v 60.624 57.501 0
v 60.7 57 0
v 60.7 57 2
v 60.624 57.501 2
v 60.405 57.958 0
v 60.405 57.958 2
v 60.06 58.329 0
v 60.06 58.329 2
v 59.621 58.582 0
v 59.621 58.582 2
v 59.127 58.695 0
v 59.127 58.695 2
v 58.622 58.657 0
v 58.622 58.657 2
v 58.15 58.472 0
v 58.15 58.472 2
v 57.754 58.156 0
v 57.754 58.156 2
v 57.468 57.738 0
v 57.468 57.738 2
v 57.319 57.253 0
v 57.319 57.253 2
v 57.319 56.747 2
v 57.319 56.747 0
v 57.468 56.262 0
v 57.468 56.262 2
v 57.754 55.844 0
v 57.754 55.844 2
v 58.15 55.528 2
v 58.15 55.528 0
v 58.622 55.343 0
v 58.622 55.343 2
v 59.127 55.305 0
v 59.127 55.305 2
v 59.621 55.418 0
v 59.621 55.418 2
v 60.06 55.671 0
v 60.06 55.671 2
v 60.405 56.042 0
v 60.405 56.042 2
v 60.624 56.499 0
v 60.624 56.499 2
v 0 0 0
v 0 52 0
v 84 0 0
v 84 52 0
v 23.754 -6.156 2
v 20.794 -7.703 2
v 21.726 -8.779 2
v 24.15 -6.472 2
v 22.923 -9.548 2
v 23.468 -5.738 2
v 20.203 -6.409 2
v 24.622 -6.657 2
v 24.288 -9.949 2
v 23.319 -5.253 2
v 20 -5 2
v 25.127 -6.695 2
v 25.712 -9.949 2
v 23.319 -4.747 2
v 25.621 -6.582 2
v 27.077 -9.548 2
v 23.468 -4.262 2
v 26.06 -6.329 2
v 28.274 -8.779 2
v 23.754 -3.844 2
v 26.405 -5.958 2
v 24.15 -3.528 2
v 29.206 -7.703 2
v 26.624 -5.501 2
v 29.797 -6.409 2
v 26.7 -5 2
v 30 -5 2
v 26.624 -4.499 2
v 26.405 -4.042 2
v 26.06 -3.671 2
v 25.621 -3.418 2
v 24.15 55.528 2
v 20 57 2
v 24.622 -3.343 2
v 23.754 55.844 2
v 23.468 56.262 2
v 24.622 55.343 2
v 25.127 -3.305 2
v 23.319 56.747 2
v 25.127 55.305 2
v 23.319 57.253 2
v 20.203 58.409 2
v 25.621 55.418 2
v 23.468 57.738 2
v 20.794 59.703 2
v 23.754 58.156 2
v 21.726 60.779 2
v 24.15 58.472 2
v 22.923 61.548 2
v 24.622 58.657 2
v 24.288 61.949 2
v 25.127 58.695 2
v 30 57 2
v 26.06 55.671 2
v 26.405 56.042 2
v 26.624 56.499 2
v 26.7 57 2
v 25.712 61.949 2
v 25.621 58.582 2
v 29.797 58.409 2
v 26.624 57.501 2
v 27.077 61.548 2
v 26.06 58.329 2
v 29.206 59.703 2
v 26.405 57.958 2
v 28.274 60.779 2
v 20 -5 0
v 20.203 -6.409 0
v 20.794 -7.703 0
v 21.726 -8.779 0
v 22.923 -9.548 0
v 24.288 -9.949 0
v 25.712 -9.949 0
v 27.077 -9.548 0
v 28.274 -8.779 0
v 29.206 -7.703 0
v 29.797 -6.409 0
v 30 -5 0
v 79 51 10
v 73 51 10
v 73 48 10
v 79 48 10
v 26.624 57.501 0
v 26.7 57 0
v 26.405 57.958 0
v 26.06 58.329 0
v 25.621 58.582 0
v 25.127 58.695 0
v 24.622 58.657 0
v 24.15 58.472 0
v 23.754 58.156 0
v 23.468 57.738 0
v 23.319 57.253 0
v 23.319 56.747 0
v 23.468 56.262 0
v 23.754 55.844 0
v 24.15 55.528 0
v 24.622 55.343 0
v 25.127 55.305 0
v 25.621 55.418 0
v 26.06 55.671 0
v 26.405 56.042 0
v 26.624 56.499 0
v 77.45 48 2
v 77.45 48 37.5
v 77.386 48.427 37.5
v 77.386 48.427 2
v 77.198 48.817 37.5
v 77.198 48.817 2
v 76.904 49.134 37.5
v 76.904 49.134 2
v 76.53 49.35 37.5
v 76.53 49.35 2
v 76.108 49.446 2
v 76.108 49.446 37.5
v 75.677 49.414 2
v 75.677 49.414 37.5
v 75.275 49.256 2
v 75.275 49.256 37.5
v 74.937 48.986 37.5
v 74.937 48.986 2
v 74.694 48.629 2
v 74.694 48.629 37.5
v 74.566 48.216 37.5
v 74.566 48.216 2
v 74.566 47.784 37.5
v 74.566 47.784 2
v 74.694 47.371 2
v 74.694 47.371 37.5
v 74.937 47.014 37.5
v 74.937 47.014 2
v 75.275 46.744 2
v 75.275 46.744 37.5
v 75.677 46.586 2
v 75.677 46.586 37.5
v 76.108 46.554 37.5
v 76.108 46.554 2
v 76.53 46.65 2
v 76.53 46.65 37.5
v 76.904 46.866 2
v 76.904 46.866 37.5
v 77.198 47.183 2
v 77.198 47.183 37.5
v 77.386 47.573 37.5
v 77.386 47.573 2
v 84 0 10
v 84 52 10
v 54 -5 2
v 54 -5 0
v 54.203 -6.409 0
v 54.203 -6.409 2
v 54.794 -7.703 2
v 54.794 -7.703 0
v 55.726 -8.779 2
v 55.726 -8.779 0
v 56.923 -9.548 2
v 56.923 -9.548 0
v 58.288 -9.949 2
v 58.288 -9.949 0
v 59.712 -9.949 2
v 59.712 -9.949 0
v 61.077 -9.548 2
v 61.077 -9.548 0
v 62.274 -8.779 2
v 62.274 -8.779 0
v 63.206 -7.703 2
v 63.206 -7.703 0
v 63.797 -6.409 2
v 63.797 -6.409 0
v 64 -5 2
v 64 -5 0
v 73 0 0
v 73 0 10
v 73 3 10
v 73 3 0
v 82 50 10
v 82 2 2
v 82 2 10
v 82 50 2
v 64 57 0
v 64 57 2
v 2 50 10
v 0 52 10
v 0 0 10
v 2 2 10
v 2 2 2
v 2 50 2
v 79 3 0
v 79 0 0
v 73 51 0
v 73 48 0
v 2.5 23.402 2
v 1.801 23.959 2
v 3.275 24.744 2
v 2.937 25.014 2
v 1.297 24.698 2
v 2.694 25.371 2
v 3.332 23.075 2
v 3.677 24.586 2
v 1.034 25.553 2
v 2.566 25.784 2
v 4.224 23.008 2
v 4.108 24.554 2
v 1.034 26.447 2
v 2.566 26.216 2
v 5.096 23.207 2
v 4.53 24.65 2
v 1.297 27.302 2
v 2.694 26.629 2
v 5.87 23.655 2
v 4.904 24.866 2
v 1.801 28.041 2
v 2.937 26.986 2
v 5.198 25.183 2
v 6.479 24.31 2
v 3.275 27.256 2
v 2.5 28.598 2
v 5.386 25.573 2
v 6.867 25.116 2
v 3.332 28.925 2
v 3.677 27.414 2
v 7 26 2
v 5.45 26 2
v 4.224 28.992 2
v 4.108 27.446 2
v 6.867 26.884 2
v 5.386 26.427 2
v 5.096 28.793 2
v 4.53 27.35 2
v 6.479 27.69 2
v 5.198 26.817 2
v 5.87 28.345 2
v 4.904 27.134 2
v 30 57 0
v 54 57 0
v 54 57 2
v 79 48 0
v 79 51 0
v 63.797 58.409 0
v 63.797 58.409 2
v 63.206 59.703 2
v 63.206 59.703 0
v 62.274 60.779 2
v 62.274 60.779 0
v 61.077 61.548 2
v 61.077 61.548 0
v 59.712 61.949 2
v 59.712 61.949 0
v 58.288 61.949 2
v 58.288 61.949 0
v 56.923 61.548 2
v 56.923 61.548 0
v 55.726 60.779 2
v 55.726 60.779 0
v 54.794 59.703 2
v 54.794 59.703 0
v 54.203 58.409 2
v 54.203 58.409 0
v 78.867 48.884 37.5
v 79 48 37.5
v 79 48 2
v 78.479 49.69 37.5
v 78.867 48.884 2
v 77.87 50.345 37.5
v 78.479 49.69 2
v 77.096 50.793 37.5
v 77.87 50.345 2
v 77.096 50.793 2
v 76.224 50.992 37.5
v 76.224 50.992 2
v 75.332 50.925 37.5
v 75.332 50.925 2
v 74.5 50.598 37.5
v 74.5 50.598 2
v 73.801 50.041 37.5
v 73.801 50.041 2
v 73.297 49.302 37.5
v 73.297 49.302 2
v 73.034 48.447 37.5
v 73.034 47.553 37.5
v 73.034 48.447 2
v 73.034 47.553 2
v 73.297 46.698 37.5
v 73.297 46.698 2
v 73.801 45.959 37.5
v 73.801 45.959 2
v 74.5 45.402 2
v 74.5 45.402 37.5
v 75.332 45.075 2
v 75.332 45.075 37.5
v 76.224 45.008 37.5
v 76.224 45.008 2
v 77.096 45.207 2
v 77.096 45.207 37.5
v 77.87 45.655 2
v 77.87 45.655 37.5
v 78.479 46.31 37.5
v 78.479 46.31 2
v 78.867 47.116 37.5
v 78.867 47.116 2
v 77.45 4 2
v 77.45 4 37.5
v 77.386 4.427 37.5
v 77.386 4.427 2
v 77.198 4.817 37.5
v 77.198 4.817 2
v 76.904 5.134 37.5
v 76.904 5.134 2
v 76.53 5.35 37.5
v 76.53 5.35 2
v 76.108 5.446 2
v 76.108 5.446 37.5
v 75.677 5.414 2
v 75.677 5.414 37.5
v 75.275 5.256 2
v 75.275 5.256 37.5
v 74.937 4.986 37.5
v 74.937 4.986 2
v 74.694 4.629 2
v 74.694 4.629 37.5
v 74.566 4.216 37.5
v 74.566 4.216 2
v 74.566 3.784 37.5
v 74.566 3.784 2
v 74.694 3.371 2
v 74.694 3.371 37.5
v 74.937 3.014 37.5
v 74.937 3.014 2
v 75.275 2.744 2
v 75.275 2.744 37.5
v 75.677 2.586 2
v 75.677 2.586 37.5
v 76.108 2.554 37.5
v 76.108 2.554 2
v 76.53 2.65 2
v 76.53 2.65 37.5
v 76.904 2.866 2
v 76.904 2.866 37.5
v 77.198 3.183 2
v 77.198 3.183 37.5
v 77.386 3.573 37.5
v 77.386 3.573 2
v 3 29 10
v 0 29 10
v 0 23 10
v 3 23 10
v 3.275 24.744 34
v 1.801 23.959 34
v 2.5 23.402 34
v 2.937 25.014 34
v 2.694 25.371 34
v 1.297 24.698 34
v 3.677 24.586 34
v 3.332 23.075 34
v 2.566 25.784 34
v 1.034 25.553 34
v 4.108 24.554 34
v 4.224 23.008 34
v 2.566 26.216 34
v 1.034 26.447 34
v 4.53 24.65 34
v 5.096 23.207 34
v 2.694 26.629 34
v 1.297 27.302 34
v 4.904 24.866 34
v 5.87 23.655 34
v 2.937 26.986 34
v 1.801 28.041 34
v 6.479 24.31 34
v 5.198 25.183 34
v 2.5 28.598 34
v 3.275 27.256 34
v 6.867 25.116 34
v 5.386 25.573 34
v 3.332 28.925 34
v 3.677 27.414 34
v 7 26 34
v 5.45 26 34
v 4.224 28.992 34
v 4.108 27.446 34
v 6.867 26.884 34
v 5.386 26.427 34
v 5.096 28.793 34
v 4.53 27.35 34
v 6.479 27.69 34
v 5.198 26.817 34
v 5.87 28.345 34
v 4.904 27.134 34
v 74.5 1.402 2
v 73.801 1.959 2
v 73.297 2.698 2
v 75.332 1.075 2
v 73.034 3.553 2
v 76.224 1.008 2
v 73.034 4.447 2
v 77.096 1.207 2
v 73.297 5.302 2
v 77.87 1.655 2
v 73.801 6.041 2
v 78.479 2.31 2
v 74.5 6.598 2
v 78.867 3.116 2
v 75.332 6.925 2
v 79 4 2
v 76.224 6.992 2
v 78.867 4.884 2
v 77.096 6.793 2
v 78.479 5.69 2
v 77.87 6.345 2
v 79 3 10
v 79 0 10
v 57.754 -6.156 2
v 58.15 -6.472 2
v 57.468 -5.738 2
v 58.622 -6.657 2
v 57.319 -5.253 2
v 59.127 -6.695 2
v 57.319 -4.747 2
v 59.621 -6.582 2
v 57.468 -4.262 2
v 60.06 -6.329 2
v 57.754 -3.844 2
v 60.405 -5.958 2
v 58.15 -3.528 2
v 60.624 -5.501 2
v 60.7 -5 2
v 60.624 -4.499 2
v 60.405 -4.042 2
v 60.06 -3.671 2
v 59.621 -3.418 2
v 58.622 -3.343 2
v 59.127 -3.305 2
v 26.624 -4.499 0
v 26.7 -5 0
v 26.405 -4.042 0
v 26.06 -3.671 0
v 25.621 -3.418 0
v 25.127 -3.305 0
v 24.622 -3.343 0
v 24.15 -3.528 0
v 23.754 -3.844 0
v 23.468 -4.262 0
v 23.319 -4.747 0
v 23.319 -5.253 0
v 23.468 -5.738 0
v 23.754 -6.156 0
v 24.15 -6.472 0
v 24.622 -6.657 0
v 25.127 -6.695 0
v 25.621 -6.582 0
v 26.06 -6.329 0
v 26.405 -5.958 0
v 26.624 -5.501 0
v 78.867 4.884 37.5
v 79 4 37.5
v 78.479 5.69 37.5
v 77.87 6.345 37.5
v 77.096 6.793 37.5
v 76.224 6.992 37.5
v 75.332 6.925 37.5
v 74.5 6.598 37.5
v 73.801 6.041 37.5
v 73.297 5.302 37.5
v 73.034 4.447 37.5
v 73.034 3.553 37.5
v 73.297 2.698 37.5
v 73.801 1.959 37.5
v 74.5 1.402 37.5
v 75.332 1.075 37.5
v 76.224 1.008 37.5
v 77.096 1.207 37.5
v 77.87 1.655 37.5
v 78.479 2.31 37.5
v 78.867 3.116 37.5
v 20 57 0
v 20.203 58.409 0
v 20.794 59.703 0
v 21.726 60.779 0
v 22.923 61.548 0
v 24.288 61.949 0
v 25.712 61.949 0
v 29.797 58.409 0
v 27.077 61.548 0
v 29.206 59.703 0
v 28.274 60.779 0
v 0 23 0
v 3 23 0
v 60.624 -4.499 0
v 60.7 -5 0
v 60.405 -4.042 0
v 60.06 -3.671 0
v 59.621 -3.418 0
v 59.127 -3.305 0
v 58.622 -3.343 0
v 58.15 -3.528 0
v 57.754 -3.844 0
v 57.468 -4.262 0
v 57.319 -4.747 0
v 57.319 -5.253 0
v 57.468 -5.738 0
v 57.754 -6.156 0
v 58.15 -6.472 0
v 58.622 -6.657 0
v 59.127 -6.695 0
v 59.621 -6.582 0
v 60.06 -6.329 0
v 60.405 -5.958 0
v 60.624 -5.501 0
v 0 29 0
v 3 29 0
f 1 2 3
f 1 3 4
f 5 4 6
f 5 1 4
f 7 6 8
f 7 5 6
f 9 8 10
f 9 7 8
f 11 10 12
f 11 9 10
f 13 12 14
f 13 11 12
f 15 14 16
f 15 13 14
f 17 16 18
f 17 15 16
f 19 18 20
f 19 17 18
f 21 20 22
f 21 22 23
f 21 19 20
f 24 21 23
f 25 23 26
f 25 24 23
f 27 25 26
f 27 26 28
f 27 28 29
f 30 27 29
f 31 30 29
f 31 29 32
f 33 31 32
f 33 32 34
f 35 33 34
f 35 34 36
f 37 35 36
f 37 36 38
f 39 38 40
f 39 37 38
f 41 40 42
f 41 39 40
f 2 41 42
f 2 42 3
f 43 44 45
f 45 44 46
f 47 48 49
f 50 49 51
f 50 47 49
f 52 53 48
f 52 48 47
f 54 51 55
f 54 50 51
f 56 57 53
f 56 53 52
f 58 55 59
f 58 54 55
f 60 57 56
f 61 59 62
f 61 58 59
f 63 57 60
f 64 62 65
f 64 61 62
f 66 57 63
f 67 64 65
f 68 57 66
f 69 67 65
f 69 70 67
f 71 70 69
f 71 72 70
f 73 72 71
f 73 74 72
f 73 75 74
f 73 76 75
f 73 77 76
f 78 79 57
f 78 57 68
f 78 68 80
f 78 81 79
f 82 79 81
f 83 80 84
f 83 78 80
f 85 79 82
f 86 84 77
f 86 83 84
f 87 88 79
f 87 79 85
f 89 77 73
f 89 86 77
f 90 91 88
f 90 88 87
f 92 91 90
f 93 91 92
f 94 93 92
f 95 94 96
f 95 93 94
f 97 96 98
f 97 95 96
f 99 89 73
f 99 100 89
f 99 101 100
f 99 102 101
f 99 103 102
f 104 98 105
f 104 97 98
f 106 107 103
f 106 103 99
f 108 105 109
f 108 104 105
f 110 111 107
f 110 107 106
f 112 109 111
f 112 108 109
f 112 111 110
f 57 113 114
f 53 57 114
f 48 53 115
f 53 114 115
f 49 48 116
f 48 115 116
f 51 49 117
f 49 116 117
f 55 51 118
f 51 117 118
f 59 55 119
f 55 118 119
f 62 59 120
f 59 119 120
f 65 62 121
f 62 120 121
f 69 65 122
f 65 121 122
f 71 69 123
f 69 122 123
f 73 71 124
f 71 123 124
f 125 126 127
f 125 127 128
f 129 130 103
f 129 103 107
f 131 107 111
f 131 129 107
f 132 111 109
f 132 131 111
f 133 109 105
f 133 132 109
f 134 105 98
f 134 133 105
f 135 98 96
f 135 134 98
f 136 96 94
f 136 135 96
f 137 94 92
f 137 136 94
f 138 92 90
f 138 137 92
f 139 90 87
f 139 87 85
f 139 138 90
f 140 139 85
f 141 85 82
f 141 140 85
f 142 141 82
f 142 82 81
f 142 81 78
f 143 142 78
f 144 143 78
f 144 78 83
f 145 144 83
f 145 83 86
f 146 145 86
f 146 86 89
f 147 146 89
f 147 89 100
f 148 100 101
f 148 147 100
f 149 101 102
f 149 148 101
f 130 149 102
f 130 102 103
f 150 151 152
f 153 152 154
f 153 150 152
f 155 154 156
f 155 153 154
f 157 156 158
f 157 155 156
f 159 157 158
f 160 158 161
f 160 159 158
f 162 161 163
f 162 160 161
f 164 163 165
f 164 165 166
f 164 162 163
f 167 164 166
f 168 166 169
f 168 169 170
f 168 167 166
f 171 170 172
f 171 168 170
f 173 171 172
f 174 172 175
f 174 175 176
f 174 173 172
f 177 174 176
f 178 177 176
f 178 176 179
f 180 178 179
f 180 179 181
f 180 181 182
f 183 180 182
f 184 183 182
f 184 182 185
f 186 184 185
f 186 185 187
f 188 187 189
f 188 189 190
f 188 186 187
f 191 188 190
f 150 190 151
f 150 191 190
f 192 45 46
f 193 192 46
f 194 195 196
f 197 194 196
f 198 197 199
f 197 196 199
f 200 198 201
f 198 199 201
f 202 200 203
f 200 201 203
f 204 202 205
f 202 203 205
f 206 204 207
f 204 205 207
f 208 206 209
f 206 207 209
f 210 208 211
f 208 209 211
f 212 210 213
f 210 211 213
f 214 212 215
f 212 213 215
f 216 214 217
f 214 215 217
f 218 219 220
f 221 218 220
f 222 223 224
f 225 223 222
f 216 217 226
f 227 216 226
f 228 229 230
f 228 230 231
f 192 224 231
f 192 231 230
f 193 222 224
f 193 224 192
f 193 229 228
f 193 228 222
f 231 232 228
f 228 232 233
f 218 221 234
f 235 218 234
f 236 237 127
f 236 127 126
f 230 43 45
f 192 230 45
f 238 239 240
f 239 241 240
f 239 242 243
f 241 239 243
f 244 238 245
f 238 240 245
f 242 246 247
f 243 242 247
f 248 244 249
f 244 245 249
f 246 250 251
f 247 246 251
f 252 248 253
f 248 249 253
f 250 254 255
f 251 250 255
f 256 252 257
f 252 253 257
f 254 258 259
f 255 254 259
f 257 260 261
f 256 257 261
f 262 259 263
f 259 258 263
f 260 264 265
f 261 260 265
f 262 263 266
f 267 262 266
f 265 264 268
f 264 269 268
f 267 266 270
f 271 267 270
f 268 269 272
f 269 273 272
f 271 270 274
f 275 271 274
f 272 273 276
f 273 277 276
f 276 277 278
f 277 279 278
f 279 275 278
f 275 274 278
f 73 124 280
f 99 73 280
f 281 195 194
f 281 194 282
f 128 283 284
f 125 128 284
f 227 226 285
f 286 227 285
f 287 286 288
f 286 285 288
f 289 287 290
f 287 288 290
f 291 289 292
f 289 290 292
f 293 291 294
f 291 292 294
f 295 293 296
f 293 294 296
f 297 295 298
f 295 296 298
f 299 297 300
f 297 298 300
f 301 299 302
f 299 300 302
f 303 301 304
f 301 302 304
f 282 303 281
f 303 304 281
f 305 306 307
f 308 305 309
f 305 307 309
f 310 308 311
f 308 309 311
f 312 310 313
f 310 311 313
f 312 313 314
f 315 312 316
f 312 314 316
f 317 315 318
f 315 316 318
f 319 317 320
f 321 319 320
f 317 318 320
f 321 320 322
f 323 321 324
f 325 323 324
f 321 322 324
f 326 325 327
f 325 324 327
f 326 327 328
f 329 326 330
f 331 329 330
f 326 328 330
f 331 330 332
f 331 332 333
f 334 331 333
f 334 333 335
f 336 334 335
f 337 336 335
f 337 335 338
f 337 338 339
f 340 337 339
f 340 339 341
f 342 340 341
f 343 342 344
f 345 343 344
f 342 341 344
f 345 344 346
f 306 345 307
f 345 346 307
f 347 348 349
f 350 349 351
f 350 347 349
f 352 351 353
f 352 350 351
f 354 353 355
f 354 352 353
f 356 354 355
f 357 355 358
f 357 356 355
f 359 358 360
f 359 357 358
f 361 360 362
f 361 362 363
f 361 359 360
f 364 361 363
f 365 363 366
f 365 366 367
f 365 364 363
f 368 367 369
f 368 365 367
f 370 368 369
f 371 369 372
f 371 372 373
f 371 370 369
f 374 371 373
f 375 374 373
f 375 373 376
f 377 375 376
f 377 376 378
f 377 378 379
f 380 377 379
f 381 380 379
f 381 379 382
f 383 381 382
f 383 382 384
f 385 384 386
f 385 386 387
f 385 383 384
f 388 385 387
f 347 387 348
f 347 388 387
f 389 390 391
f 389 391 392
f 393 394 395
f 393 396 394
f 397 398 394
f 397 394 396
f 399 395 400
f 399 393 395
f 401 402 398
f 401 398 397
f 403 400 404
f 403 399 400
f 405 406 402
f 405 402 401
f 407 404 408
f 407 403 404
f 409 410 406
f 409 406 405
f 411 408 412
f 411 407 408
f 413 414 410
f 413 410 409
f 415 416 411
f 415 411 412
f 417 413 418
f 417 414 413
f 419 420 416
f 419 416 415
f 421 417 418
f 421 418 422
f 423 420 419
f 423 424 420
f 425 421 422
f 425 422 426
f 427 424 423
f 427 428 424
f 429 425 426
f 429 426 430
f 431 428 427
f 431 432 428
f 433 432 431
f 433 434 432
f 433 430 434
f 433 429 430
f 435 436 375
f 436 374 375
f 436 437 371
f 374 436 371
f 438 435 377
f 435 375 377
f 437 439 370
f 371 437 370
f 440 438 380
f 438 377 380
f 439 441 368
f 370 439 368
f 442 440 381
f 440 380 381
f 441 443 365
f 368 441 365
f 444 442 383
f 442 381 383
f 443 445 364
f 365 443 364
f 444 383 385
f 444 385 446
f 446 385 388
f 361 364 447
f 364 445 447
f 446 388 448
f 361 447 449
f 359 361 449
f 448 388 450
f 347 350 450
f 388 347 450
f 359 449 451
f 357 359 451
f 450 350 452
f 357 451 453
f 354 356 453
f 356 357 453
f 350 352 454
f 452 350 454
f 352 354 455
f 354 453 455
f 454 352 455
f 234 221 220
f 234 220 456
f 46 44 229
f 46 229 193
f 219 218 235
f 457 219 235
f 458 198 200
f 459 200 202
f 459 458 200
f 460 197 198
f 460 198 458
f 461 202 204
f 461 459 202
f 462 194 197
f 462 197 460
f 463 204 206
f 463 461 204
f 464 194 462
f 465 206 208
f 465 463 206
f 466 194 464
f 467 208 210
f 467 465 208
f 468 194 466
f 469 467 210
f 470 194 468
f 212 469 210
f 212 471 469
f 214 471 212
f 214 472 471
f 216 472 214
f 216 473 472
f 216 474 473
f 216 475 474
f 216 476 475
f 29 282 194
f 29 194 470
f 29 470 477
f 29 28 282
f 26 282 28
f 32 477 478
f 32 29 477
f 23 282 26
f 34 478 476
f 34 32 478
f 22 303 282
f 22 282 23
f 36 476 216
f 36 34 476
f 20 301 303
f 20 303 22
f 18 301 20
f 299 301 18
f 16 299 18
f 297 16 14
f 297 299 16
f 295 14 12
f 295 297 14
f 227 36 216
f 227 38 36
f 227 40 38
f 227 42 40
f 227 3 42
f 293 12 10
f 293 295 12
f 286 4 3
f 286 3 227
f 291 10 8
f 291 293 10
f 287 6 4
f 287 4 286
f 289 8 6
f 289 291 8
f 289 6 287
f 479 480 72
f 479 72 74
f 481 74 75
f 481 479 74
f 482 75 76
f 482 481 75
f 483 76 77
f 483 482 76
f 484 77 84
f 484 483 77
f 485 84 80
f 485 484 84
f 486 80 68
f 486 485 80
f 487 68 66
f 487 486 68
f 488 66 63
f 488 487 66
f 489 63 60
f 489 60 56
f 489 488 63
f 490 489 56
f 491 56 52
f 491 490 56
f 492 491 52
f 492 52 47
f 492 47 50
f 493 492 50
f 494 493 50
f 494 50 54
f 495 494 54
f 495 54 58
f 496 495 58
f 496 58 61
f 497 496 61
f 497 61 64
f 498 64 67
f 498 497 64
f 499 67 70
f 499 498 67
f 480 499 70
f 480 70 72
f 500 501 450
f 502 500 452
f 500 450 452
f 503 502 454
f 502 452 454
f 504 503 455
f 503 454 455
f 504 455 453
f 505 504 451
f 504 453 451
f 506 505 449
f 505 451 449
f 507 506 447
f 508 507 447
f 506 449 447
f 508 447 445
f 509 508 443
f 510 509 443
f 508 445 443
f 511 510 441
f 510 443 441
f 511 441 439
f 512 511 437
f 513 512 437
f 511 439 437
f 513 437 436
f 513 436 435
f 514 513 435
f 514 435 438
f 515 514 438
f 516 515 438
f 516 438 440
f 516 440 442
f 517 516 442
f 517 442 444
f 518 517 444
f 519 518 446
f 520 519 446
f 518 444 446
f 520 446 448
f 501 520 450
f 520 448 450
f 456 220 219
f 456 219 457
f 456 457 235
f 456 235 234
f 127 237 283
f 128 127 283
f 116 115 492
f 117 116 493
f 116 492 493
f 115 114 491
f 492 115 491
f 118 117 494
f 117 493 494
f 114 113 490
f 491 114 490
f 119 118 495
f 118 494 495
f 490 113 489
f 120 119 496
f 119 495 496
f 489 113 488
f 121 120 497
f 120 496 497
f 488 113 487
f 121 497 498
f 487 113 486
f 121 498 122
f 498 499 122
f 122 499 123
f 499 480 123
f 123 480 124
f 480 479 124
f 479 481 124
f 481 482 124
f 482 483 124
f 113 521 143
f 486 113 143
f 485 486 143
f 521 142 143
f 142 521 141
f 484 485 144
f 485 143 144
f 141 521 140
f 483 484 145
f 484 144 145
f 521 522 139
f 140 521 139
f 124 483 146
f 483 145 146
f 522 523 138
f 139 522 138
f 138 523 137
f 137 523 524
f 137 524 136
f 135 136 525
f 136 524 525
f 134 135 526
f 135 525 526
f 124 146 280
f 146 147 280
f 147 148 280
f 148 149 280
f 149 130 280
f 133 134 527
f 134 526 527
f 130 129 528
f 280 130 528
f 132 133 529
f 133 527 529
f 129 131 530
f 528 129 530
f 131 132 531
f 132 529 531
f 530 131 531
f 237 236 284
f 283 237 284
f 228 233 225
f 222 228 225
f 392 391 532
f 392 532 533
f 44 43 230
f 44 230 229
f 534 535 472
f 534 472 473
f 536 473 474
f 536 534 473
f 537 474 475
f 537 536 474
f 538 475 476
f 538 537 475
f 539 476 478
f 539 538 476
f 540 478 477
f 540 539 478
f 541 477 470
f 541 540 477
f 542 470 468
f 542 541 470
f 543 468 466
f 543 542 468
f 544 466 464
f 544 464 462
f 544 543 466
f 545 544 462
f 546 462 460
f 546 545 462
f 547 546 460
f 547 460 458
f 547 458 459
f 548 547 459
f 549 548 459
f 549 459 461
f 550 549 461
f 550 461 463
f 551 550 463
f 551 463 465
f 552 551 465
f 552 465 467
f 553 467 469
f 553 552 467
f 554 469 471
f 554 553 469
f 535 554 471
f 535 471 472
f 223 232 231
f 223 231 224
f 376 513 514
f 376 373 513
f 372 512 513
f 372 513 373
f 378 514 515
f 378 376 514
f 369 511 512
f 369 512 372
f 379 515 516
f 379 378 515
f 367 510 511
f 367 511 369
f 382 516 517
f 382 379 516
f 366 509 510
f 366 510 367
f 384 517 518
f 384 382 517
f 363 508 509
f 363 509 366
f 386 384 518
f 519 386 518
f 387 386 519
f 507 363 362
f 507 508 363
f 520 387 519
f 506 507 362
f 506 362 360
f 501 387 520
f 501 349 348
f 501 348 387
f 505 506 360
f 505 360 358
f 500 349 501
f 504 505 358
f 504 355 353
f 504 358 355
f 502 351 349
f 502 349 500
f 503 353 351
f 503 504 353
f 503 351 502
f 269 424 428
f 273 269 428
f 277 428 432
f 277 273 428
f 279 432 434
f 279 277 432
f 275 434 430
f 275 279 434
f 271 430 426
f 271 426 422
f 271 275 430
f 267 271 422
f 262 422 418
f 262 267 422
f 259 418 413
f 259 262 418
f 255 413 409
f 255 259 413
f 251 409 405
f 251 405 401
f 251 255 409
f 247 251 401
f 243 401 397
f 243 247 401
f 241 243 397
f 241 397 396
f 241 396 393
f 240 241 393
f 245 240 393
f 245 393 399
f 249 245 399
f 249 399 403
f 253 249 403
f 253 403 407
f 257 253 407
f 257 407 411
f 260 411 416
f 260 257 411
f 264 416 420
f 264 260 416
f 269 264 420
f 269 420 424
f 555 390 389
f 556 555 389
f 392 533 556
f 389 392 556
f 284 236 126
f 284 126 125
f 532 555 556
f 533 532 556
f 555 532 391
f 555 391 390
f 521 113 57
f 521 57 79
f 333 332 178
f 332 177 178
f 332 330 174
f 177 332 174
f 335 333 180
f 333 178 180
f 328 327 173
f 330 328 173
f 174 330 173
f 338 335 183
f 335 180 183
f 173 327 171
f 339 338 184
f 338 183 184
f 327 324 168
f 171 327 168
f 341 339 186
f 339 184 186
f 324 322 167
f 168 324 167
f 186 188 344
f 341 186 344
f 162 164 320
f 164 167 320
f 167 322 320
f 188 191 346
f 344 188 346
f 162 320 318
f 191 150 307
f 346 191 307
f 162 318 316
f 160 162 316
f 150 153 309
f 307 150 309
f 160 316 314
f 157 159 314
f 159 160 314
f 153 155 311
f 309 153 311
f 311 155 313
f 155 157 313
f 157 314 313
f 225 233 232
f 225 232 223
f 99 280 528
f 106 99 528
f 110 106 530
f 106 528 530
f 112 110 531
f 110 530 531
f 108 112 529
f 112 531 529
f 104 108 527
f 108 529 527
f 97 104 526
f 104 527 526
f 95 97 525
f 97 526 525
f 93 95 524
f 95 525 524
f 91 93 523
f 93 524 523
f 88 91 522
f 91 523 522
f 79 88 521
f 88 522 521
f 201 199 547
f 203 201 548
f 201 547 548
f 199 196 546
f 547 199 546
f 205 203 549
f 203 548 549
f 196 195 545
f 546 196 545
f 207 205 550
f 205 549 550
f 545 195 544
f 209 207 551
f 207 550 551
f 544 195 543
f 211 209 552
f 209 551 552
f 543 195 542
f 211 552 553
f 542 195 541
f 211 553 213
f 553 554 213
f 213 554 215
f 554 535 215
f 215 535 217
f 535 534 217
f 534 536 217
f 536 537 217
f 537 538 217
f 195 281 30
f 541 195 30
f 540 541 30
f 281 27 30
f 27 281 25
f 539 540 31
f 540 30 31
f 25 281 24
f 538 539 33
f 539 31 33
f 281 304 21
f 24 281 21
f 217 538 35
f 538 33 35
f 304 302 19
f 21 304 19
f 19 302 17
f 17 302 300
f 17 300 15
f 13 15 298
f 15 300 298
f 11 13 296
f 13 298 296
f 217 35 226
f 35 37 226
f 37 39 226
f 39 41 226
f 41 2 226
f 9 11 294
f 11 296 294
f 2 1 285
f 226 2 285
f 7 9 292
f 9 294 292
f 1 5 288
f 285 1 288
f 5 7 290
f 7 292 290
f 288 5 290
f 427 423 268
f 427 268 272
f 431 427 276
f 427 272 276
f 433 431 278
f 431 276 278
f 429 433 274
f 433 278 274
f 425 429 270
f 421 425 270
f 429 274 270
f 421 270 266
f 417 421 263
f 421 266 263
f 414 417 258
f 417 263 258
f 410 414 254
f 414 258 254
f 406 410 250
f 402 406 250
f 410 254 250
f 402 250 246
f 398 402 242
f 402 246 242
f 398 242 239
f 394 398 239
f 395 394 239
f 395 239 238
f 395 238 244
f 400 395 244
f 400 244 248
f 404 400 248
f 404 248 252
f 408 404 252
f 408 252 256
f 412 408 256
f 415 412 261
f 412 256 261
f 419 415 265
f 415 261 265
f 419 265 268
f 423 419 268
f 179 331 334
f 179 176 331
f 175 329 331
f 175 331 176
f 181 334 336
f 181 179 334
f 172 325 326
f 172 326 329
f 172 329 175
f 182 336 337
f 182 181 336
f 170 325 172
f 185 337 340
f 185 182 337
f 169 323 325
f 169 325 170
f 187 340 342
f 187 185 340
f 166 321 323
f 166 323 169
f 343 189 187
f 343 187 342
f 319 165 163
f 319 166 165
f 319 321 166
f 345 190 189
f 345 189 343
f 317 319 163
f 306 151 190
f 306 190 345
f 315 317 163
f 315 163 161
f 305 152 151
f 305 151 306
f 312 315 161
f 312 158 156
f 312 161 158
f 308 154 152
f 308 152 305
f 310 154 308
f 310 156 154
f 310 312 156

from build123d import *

# Parameters (mm, degrees)
CYLINDER005_R     = 1.45
CYLINDER005_DEPTH = 32
CYLINDER_R        = 3
CYLINDER_DEPTH    = 32
CYLINDER003_R     = 1.45
CYLINDER003_DEPTH = 35.5
CYLINDER001_R     = 3
CYLINDER001_DEPTH = 35.5
CYLINDER004_R     = 1.45
CYLINDER004_DEPTH = 35.5
CYLINDER002_R     = 3
CYLINDER002_DEPTH = 35.5
BOX001_W          = 80
BOX001_H          = 48
BOX001_DEPTH      = 10
BOX_W             = 84
BOX_H             = 52
BOX_DEPTH         = 10
BOX002_W          = 3
BOX002_H          = 6
BOX002_DEPTH      = 10
BOX003_W          = 6
BOX003_H          = 3
BOX003_DEPTH      = 10
BOX004_W          = 6
BOX004_H          = 3
BOX004_DEPTH      = 10
CYLINDER008_R     = 1.7
CYLINDER008_DEPTH = 2
CYLINDER009_R     = 1.7
CYLINDER009_DEPTH = 2
BOX005_W          = 10
BOX005_H          = 62
BOX005_DEPTH      = 2
CYLINDER006_R     = 5
CYLINDER006_DEPTH = 2
CYLINDER007_R     = 5
CYLINDER007_DEPTH = 2
CYLINDER010_R     = 1.7
CYLINDER010_DEPTH = 2
CYLINDER011_R     = 1.7
CYLINDER011_DEPTH = 2
BOX006_W          = 10
BOX006_H          = 62
BOX006_DEPTH      = 2
CYLINDER013_R     = 5
CYLINDER013_DEPTH = 2
CYLINDER012_R     = 5
CYLINDER012_DEPTH = 2


with BuildPart() as cylinder005:
    # Cylinder005 → Cylinder005 (new body)
    with BuildSketch(Plane(origin=(4, 26, 2), x_dir=(1, 0, 0), z_dir=(0, 0, 1))):
        Circle(CYLINDER005_R)
    extrude(amount=CYLINDER005_DEPTH)


with BuildPart() as cut:
    # Cylinder → Cylinder (new body)
    with BuildSketch(Plane(origin=(4, 26, 2), x_dir=(1, 0, 0), z_dir=(0, 0, 1))):
        Circle(CYLINDER_R)
    extrude(amount=CYLINDER_DEPTH)

    # Cut: cut Cylinder005
    add(cylinder005.part, mode=Mode.SUBTRACT)


with BuildPart() as cylinder003:
    # Cylinder003 → Cylinder003 (new body)
    with BuildSketch(Plane(origin=(76, 4, 2), x_dir=(1, 0, 0), z_dir=(0, 0, 1))):
        Circle(CYLINDER003_R)
    extrude(amount=CYLINDER003_DEPTH)


with BuildPart() as cut001:
    # Cylinder001 → Cylinder001 (new body)
    with BuildSketch(Plane(origin=(76, 4, 2), x_dir=(1, 0, 0), z_dir=(0, 0, 1))):
        Circle(CYLINDER001_R)
    extrude(amount=CYLINDER001_DEPTH)

    # Cut001: cut Cylinder003
    add(cylinder003.part, mode=Mode.SUBTRACT)


with BuildPart() as cylinder004:
    # Cylinder004 → Cylinder004 (new body)
    with BuildSketch(Plane(origin=(76, 48, 2), x_dir=(1, 0, 0), z_dir=(0, 0, 1))):
        Circle(CYLINDER004_R)
    extrude(amount=CYLINDER004_DEPTH)


with BuildPart() as cut002:
    # Cylinder002 → Cylinder002 (new body)
    with BuildSketch(Plane(origin=(76, 48, 2), x_dir=(1, 0, 0), z_dir=(0, 0, 1))):
        Circle(CYLINDER002_R)
    extrude(amount=CYLINDER002_DEPTH)

    # Cut002: cut Cylinder004
    add(cylinder004.part, mode=Mode.SUBTRACT)


with BuildPart() as cube001:
    # Box001 → Box001 (new body)
    with BuildSketch(Plane(origin=(2, 2, 2), x_dir=(1, 0, 0), z_dir=(0, 0, 1))):
        with Locations((40, 24)):
            Rectangle(BOX001_W, BOX001_H)
    extrude(amount=BOX001_DEPTH)


with BuildPart() as cut003:
    # Box → Box (new body)
    with BuildSketch(Plane.XY):
        with Locations((42, 26)):
            Rectangle(BOX_W, BOX_H)
    extrude(amount=BOX_DEPTH)

    # Cut003: cut Cube001
    add(cube001.part, mode=Mode.SUBTRACT)


with BuildPart() as cube002:
    # Box002 → Box002 (new body)
    with BuildSketch(Plane(origin=(0, 23, 0), x_dir=(1, 0, 0), z_dir=(0, 0, 1))):
        with Locations((1.5, 3)):
            Rectangle(BOX002_W, BOX002_H)
    extrude(amount=BOX002_DEPTH)


with BuildPart() as cube003:
    # Box003 → Box003 (new body)
    with BuildSketch(Plane(origin=(73, 0, 0), x_dir=(1, 0, 0), z_dir=(0, 0, 1))):
        with Locations((3, 1.5)):
            Rectangle(BOX003_W, BOX003_H)
    extrude(amount=BOX003_DEPTH)


with BuildPart() as cube004:
    # Box004 → Box004 (new body)
    with BuildSketch(Plane(origin=(73, 48, 0), x_dir=(1, 0, 0), z_dir=(0, 0, 1))):
        with Locations((3, 1.5)):
            Rectangle(BOX004_W, BOX004_H)
    extrude(amount=BOX004_DEPTH)


with BuildPart() as cylinder008:
    # Cylinder008 → Cylinder008 (new body)
    with BuildSketch(Plane(origin=(25, 57, 0), x_dir=(1, 0, 0), z_dir=(0, 0, 1))):
        Circle(CYLINDER008_R)
    extrude(amount=CYLINDER008_DEPTH)


with BuildPart() as fusion001:
    # Cylinder009 → Cylinder009 (new body)
    with BuildSketch(Plane(origin=(25, -5, 0), x_dir=(1, 0, 0), z_dir=(0, 0, 1))):
        Circle(CYLINDER009_R)
    extrude(amount=CYLINDER009_DEPTH)

    # Fusion001: union Cylinder008
    add(cylinder008.part)


with BuildPart() as cube005:
    # Box005 → Box005 (new body)
    with BuildSketch(Plane(origin=(20, -5, 0), x_dir=(1, 0, 0), z_dir=(0, 0, 1))):
        with Locations((5, 31)):
            Rectangle(BOX005_W, BOX005_H)
    extrude(amount=BOX005_DEPTH)


with BuildPart() as cylinder006:
    # Cylinder006 → Cylinder006 (new body)
    with BuildSketch(Plane(origin=(25, -5, 0), x_dir=(1, 0, 0), z_dir=(0, 0, 1))):
        Circle(CYLINDER006_R)
    extrude(amount=CYLINDER006_DEPTH)


with BuildPart() as cut004:
    # Cylinder007 → Cylinder007 (new body)
    with BuildSketch(Plane(origin=(25, 57, 0), x_dir=(1, 0, 0), z_dir=(0, 0, 1))):
        Circle(CYLINDER007_R)
    extrude(amount=CYLINDER007_DEPTH)

    # Fusion: union Cube005, Cylinder006
    add(cube005.part)
    add(cylinder006.part)

    # Cut004: cut Fusion001
    add(fusion001.part, mode=Mode.SUBTRACT)


with BuildPart() as cylinder010:
    # Cylinder010 → Cylinder010 (new body)
    with BuildSketch(Plane(origin=(25, 57, 0), x_dir=(1, 0, 0), z_dir=(0, 0, 1))):
        Circle(CYLINDER010_R)
    extrude(amount=CYLINDER010_DEPTH)


with BuildPart() as fusion002:
    # Cylinder011 → Cylinder011 (new body)
    with BuildSketch(Plane(origin=(25, -5, 0), x_dir=(1, 0, 0), z_dir=(0, 0, 1))):
        Circle(CYLINDER011_R)
    extrude(amount=CYLINDER011_DEPTH)

    # Fusion002: union Cylinder010
    add(cylinder010.part)


with BuildPart() as cube006:
    # Box006 → Box006 (new body)
    with BuildSketch(Plane(origin=(20, -5, 0), x_dir=(1, 0, 0), z_dir=(0, 0, 1))):
        with Locations((5, 31)):
            Rectangle(BOX006_W, BOX006_H)
    extrude(amount=BOX006_DEPTH)


with BuildPart() as cylinder013:
    # Cylinder013 → Cylinder013 (new body)
    with BuildSketch(Plane(origin=(25, -5, 0), x_dir=(1, 0, 0), z_dir=(0, 0, 1))):
        Circle(CYLINDER013_R)
    extrude(amount=CYLINDER013_DEPTH)


with BuildPart() as cut005:
    # Cylinder012 → Cylinder012 (new body)
    with BuildSketch(Plane(origin=(25, 57, 0), x_dir=(1, 0, 0), z_dir=(0, 0, 1))):
        Circle(CYLINDER012_R)
    extrude(amount=CYLINDER012_DEPTH)

    # Fusion003: union Cube006, Cylinder013
    add(cube006.part)
    add(cylinder013.part)

    # Cut005: cut Fusion002
    add(fusion002.part, mode=Mode.SUBTRACT)


with BuildPart() as cut005_1:
    # Cut005 placement: moved
    add(cut005.part.moved(Location((34, 0, 0))))


solid = Compound([cut.part, cut001.part, cut002.part, cut003.part, cube002.part, cube003.part, cube004.part, cut004.part, cut005_1.part])
